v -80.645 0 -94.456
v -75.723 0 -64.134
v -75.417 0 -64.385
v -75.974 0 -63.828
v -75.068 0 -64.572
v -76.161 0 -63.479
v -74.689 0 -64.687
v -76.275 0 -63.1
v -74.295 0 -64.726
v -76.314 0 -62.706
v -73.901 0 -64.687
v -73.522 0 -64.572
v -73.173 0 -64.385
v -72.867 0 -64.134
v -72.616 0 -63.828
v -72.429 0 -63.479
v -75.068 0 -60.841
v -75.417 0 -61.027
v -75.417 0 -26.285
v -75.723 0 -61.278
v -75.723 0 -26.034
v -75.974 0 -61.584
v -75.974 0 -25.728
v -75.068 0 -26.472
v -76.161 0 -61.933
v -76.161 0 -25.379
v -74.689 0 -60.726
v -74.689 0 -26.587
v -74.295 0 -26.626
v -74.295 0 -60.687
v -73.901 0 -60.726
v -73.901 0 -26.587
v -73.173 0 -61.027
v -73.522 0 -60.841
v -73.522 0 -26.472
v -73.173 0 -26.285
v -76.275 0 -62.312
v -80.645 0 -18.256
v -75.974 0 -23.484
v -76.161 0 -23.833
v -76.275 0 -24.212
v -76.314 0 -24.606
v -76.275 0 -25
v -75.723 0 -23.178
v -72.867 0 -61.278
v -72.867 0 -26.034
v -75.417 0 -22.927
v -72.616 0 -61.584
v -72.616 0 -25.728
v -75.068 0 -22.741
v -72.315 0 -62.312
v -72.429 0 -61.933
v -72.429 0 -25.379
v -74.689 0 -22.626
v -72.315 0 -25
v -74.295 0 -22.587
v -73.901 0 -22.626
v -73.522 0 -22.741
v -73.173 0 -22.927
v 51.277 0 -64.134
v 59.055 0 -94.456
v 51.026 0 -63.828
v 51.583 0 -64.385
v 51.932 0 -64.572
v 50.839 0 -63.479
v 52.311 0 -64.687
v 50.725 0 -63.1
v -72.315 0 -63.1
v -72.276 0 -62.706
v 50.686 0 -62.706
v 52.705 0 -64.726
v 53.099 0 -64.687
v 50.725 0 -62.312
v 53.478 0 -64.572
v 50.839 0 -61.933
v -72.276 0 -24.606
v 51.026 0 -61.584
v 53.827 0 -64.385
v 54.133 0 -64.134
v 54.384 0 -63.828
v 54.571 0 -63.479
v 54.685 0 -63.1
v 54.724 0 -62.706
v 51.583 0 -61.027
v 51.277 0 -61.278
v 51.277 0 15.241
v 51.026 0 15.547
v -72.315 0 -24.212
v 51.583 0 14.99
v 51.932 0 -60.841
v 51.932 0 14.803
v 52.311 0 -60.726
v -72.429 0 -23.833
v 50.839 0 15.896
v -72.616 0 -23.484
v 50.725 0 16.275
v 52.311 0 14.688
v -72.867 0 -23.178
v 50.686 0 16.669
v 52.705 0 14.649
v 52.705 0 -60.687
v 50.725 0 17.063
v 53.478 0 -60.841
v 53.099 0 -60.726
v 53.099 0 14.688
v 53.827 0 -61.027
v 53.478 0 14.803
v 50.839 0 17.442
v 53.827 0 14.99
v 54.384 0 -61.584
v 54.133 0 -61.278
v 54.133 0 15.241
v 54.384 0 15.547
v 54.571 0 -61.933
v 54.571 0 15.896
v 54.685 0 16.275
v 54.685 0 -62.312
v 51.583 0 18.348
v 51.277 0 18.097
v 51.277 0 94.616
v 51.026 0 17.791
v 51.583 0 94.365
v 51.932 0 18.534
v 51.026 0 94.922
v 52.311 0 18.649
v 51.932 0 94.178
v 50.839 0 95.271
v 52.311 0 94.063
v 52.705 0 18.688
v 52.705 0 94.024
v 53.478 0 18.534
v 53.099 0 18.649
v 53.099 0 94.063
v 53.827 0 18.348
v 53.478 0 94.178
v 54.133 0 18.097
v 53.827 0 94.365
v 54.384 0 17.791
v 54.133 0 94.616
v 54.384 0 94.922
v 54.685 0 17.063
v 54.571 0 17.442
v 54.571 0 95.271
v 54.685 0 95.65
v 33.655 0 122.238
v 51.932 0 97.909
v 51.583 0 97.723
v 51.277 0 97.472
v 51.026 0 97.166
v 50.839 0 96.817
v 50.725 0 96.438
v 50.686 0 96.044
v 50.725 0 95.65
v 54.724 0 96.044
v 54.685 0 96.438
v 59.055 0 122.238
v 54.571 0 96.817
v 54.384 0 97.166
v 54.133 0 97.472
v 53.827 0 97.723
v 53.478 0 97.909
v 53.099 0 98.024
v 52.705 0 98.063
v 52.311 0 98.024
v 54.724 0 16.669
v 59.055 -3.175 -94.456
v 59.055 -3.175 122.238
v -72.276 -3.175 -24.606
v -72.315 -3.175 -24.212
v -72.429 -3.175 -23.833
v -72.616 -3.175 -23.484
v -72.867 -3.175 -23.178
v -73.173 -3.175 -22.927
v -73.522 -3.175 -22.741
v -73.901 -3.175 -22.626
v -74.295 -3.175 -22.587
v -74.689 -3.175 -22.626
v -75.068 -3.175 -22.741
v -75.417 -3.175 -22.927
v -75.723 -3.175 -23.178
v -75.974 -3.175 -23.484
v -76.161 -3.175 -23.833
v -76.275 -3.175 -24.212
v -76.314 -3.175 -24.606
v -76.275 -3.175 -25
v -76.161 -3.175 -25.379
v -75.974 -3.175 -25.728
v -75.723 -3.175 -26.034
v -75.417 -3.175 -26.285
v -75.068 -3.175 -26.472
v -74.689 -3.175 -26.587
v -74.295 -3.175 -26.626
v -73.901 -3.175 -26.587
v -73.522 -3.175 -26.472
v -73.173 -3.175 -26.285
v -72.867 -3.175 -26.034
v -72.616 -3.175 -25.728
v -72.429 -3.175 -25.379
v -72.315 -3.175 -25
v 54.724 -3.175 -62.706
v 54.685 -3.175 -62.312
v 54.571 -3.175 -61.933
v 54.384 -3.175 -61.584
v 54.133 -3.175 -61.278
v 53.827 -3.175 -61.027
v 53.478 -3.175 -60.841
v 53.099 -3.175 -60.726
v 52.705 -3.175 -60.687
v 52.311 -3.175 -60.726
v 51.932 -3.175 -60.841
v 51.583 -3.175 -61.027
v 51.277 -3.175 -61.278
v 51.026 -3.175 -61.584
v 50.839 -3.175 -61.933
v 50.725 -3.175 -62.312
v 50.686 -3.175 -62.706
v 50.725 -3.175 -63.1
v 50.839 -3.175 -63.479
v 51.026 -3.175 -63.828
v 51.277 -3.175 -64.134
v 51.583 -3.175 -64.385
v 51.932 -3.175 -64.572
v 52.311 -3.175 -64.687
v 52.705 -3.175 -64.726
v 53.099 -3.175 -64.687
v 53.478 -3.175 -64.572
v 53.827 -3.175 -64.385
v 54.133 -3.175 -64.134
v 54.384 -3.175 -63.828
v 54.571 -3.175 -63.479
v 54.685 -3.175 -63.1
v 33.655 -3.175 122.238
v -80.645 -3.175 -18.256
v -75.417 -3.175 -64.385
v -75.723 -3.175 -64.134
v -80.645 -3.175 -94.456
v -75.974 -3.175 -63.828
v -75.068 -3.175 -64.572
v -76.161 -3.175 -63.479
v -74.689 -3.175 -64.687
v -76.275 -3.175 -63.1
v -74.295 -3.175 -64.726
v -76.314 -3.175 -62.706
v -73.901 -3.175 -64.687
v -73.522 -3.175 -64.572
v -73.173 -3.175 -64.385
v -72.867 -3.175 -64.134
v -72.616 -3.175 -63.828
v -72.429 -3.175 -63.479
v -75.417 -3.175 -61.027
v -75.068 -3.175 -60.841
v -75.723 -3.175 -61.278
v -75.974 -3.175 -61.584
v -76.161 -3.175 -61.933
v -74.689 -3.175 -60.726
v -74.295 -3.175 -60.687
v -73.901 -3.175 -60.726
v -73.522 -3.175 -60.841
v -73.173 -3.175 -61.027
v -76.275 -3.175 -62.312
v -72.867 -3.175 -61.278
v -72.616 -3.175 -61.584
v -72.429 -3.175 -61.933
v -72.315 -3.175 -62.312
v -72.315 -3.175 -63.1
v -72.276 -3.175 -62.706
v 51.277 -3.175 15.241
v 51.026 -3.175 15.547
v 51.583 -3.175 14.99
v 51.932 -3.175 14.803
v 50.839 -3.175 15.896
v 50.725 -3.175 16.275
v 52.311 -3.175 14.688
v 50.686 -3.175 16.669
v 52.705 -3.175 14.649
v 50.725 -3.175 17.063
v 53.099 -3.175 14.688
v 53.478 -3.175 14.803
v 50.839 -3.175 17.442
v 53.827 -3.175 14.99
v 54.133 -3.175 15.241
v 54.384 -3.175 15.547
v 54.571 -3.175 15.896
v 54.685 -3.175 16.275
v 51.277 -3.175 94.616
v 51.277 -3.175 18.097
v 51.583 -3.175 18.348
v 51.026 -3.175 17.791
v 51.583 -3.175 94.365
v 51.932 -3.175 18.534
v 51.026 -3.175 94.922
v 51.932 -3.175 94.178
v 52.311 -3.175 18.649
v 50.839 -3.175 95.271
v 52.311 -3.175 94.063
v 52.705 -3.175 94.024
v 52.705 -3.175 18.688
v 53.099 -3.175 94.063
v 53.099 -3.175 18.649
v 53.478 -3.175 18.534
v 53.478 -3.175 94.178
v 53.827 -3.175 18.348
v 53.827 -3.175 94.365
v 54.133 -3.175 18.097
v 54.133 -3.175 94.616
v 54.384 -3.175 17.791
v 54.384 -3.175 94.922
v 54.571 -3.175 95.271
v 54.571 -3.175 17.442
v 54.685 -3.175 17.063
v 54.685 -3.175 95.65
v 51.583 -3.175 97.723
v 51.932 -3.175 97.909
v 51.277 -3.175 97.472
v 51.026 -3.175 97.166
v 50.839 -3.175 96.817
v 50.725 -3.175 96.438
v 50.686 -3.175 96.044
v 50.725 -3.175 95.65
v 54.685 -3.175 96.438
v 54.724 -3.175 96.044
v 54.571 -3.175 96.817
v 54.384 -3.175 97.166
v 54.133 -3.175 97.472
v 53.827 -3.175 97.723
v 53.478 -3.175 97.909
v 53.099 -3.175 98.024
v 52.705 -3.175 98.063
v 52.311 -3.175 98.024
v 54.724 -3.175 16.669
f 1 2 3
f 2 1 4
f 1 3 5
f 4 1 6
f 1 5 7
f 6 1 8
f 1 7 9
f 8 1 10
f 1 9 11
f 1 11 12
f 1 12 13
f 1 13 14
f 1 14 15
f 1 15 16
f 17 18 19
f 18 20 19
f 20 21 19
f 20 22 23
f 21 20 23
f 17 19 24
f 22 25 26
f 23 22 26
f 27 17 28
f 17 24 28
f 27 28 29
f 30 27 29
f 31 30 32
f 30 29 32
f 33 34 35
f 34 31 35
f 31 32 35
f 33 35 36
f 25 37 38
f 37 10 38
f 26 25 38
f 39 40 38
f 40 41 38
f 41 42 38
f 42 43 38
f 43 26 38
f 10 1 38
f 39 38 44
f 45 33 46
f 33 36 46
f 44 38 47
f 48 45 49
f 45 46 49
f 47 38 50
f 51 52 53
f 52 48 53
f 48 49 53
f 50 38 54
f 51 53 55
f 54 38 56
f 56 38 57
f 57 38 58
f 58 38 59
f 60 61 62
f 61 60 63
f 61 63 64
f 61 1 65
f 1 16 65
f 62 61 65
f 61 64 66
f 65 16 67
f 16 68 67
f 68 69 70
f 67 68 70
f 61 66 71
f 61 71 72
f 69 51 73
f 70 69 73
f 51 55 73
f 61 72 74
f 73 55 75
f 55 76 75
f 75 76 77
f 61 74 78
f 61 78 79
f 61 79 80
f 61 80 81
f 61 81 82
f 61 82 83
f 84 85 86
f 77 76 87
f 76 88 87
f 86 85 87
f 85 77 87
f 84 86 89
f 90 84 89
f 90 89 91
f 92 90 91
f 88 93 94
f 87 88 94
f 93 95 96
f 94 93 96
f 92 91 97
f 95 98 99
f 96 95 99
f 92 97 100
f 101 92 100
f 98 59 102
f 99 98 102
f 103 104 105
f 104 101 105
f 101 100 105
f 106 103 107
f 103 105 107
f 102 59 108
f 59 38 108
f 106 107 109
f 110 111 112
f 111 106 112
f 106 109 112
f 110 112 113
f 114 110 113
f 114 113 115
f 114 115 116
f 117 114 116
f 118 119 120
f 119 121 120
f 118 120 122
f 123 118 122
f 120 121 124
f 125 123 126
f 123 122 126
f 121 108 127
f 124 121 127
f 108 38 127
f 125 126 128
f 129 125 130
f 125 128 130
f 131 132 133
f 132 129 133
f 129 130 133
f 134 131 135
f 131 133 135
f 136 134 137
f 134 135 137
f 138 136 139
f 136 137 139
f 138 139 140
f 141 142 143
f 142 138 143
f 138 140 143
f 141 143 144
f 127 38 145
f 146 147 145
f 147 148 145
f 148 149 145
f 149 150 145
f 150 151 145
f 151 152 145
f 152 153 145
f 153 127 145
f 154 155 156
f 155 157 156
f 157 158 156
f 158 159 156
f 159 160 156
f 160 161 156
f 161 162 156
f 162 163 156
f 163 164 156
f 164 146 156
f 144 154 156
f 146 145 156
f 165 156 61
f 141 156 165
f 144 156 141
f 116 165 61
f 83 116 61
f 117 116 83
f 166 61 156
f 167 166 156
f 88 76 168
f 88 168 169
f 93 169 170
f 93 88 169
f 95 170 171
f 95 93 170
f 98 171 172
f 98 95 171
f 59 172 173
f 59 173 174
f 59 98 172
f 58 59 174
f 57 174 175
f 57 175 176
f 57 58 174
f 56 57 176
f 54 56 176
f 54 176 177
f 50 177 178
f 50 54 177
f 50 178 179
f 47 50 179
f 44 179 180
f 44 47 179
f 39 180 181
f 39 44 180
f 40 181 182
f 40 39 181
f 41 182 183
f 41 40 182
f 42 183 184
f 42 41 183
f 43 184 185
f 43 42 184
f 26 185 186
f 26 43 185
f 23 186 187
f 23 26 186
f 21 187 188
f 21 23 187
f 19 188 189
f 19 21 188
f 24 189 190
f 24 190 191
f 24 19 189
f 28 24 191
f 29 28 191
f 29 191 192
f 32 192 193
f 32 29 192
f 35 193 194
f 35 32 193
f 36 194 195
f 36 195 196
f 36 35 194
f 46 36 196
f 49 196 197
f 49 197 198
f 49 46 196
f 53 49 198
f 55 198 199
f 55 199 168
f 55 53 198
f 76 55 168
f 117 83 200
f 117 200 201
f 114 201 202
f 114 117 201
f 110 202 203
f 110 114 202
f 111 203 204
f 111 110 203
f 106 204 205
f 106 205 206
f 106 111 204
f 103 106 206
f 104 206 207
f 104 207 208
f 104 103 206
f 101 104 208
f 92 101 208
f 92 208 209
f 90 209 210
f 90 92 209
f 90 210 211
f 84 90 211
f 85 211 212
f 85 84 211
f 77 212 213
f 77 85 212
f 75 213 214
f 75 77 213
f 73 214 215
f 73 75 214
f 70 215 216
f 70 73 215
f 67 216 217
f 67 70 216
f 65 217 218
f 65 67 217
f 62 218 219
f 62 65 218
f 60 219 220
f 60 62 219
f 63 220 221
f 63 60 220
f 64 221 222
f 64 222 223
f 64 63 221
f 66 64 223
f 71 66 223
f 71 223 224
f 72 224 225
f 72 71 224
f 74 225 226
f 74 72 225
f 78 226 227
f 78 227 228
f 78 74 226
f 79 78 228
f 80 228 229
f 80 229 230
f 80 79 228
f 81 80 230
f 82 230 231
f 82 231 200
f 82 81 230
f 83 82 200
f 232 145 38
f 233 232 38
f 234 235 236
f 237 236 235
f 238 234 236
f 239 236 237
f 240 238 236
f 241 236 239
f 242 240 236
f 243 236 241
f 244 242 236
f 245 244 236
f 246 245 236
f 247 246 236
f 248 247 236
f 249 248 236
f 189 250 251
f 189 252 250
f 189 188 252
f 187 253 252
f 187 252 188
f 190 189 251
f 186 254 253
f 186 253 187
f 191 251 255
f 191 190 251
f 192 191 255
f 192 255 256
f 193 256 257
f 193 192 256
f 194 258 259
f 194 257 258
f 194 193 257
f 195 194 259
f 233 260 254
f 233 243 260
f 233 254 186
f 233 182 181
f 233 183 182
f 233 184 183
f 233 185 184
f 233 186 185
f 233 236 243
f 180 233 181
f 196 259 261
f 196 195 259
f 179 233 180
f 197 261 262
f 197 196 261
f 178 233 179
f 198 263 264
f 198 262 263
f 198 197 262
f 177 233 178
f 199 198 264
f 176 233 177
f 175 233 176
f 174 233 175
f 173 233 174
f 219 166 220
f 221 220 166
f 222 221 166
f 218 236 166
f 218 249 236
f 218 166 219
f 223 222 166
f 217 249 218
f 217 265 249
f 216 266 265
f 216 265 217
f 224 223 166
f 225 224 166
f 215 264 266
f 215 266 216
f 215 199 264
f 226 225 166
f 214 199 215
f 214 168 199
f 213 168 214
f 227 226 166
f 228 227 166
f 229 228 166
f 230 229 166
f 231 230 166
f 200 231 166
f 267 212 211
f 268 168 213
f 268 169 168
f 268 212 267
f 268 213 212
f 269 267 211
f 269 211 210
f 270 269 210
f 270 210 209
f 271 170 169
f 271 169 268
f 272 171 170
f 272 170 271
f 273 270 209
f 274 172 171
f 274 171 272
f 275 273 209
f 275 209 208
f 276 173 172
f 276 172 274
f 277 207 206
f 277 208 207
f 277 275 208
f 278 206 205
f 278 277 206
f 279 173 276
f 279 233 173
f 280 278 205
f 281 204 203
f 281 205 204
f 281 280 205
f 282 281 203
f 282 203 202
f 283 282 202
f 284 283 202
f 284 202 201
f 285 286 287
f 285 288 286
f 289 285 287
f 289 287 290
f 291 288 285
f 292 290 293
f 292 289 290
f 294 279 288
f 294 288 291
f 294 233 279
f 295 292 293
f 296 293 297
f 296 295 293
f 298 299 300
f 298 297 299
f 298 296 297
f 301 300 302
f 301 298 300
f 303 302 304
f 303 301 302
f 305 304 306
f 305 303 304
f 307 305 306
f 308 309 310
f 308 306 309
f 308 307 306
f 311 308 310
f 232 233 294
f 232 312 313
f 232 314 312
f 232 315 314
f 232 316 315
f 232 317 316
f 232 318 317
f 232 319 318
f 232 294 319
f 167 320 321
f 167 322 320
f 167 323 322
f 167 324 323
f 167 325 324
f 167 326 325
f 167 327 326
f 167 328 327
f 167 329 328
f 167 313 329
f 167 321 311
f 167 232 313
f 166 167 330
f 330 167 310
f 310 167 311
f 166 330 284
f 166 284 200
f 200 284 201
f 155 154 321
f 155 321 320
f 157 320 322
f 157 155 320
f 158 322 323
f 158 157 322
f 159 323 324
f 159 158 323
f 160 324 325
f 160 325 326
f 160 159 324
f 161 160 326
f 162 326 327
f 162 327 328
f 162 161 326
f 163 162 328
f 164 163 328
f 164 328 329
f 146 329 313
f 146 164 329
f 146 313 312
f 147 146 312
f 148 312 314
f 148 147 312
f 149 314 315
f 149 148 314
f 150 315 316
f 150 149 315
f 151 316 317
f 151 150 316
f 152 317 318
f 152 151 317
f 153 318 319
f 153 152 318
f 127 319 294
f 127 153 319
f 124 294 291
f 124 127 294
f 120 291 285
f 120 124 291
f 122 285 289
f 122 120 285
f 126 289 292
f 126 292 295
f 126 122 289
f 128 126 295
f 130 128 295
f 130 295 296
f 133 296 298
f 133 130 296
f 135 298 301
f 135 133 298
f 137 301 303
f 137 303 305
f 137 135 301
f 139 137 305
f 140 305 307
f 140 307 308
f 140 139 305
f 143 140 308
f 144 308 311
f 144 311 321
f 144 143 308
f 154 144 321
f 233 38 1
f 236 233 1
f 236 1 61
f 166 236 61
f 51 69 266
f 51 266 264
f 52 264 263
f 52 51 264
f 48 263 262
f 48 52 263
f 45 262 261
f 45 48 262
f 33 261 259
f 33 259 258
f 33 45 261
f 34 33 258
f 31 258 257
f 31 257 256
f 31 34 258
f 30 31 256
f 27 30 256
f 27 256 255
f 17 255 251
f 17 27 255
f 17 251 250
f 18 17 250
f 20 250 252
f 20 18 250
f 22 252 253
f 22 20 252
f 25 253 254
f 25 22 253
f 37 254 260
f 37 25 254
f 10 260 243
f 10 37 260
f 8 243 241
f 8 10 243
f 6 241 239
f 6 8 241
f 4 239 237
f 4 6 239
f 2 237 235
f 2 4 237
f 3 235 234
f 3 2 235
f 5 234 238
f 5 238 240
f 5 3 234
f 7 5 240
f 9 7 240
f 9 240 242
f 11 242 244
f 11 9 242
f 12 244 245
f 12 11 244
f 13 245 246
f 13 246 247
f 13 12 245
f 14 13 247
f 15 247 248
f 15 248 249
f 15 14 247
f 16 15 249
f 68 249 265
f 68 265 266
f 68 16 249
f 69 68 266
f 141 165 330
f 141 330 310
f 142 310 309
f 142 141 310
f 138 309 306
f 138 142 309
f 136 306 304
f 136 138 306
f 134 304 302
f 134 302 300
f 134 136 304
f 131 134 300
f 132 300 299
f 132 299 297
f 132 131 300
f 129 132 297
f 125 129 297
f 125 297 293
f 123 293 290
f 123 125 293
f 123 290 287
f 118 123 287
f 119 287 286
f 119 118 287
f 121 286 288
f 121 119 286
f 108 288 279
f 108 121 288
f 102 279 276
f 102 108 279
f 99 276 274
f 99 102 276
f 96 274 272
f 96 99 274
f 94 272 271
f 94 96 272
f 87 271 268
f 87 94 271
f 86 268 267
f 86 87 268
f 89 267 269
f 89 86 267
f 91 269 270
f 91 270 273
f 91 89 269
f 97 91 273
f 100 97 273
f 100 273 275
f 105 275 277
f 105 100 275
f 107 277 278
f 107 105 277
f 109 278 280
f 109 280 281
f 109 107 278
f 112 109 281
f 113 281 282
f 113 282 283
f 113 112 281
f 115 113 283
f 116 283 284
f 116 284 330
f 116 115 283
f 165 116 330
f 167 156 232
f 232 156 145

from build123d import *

# Parameters (mm, degrees)
F0_R     = 2.0193
F1_DEPTH = 3.175


with BuildPart() as f1:
    # F0 (on Front) → F1 (new body)
    with BuildSketch(Plane.XZ):
        Polygon((-80.645, -94.45625), (59.055, -94.45625), (59.055, 122.2375), (33.655, 122.2375), (-80.645, -18.25625), align=None)
        with Locations((-74.295, -62.70625)):
            Circle(F0_R, mode=Mode.SUBTRACT)
        with Locations((-74.295, -24.60625)):
            Circle(F0_R, mode=Mode.SUBTRACT)
        with Locations((52.705, -62.70625)):
            Circle(F0_R, mode=Mode.SUBTRACT)
        with Locations((52.705, 16.66875)):
            Circle(F0_R, mode=Mode.SUBTRACT)
        with Locations((52.705, 96.04375)):
            Circle(F0_R, mode=Mode.SUBTRACT)
    extrude(amount=F1_DEPTH)


solid = f1.part
